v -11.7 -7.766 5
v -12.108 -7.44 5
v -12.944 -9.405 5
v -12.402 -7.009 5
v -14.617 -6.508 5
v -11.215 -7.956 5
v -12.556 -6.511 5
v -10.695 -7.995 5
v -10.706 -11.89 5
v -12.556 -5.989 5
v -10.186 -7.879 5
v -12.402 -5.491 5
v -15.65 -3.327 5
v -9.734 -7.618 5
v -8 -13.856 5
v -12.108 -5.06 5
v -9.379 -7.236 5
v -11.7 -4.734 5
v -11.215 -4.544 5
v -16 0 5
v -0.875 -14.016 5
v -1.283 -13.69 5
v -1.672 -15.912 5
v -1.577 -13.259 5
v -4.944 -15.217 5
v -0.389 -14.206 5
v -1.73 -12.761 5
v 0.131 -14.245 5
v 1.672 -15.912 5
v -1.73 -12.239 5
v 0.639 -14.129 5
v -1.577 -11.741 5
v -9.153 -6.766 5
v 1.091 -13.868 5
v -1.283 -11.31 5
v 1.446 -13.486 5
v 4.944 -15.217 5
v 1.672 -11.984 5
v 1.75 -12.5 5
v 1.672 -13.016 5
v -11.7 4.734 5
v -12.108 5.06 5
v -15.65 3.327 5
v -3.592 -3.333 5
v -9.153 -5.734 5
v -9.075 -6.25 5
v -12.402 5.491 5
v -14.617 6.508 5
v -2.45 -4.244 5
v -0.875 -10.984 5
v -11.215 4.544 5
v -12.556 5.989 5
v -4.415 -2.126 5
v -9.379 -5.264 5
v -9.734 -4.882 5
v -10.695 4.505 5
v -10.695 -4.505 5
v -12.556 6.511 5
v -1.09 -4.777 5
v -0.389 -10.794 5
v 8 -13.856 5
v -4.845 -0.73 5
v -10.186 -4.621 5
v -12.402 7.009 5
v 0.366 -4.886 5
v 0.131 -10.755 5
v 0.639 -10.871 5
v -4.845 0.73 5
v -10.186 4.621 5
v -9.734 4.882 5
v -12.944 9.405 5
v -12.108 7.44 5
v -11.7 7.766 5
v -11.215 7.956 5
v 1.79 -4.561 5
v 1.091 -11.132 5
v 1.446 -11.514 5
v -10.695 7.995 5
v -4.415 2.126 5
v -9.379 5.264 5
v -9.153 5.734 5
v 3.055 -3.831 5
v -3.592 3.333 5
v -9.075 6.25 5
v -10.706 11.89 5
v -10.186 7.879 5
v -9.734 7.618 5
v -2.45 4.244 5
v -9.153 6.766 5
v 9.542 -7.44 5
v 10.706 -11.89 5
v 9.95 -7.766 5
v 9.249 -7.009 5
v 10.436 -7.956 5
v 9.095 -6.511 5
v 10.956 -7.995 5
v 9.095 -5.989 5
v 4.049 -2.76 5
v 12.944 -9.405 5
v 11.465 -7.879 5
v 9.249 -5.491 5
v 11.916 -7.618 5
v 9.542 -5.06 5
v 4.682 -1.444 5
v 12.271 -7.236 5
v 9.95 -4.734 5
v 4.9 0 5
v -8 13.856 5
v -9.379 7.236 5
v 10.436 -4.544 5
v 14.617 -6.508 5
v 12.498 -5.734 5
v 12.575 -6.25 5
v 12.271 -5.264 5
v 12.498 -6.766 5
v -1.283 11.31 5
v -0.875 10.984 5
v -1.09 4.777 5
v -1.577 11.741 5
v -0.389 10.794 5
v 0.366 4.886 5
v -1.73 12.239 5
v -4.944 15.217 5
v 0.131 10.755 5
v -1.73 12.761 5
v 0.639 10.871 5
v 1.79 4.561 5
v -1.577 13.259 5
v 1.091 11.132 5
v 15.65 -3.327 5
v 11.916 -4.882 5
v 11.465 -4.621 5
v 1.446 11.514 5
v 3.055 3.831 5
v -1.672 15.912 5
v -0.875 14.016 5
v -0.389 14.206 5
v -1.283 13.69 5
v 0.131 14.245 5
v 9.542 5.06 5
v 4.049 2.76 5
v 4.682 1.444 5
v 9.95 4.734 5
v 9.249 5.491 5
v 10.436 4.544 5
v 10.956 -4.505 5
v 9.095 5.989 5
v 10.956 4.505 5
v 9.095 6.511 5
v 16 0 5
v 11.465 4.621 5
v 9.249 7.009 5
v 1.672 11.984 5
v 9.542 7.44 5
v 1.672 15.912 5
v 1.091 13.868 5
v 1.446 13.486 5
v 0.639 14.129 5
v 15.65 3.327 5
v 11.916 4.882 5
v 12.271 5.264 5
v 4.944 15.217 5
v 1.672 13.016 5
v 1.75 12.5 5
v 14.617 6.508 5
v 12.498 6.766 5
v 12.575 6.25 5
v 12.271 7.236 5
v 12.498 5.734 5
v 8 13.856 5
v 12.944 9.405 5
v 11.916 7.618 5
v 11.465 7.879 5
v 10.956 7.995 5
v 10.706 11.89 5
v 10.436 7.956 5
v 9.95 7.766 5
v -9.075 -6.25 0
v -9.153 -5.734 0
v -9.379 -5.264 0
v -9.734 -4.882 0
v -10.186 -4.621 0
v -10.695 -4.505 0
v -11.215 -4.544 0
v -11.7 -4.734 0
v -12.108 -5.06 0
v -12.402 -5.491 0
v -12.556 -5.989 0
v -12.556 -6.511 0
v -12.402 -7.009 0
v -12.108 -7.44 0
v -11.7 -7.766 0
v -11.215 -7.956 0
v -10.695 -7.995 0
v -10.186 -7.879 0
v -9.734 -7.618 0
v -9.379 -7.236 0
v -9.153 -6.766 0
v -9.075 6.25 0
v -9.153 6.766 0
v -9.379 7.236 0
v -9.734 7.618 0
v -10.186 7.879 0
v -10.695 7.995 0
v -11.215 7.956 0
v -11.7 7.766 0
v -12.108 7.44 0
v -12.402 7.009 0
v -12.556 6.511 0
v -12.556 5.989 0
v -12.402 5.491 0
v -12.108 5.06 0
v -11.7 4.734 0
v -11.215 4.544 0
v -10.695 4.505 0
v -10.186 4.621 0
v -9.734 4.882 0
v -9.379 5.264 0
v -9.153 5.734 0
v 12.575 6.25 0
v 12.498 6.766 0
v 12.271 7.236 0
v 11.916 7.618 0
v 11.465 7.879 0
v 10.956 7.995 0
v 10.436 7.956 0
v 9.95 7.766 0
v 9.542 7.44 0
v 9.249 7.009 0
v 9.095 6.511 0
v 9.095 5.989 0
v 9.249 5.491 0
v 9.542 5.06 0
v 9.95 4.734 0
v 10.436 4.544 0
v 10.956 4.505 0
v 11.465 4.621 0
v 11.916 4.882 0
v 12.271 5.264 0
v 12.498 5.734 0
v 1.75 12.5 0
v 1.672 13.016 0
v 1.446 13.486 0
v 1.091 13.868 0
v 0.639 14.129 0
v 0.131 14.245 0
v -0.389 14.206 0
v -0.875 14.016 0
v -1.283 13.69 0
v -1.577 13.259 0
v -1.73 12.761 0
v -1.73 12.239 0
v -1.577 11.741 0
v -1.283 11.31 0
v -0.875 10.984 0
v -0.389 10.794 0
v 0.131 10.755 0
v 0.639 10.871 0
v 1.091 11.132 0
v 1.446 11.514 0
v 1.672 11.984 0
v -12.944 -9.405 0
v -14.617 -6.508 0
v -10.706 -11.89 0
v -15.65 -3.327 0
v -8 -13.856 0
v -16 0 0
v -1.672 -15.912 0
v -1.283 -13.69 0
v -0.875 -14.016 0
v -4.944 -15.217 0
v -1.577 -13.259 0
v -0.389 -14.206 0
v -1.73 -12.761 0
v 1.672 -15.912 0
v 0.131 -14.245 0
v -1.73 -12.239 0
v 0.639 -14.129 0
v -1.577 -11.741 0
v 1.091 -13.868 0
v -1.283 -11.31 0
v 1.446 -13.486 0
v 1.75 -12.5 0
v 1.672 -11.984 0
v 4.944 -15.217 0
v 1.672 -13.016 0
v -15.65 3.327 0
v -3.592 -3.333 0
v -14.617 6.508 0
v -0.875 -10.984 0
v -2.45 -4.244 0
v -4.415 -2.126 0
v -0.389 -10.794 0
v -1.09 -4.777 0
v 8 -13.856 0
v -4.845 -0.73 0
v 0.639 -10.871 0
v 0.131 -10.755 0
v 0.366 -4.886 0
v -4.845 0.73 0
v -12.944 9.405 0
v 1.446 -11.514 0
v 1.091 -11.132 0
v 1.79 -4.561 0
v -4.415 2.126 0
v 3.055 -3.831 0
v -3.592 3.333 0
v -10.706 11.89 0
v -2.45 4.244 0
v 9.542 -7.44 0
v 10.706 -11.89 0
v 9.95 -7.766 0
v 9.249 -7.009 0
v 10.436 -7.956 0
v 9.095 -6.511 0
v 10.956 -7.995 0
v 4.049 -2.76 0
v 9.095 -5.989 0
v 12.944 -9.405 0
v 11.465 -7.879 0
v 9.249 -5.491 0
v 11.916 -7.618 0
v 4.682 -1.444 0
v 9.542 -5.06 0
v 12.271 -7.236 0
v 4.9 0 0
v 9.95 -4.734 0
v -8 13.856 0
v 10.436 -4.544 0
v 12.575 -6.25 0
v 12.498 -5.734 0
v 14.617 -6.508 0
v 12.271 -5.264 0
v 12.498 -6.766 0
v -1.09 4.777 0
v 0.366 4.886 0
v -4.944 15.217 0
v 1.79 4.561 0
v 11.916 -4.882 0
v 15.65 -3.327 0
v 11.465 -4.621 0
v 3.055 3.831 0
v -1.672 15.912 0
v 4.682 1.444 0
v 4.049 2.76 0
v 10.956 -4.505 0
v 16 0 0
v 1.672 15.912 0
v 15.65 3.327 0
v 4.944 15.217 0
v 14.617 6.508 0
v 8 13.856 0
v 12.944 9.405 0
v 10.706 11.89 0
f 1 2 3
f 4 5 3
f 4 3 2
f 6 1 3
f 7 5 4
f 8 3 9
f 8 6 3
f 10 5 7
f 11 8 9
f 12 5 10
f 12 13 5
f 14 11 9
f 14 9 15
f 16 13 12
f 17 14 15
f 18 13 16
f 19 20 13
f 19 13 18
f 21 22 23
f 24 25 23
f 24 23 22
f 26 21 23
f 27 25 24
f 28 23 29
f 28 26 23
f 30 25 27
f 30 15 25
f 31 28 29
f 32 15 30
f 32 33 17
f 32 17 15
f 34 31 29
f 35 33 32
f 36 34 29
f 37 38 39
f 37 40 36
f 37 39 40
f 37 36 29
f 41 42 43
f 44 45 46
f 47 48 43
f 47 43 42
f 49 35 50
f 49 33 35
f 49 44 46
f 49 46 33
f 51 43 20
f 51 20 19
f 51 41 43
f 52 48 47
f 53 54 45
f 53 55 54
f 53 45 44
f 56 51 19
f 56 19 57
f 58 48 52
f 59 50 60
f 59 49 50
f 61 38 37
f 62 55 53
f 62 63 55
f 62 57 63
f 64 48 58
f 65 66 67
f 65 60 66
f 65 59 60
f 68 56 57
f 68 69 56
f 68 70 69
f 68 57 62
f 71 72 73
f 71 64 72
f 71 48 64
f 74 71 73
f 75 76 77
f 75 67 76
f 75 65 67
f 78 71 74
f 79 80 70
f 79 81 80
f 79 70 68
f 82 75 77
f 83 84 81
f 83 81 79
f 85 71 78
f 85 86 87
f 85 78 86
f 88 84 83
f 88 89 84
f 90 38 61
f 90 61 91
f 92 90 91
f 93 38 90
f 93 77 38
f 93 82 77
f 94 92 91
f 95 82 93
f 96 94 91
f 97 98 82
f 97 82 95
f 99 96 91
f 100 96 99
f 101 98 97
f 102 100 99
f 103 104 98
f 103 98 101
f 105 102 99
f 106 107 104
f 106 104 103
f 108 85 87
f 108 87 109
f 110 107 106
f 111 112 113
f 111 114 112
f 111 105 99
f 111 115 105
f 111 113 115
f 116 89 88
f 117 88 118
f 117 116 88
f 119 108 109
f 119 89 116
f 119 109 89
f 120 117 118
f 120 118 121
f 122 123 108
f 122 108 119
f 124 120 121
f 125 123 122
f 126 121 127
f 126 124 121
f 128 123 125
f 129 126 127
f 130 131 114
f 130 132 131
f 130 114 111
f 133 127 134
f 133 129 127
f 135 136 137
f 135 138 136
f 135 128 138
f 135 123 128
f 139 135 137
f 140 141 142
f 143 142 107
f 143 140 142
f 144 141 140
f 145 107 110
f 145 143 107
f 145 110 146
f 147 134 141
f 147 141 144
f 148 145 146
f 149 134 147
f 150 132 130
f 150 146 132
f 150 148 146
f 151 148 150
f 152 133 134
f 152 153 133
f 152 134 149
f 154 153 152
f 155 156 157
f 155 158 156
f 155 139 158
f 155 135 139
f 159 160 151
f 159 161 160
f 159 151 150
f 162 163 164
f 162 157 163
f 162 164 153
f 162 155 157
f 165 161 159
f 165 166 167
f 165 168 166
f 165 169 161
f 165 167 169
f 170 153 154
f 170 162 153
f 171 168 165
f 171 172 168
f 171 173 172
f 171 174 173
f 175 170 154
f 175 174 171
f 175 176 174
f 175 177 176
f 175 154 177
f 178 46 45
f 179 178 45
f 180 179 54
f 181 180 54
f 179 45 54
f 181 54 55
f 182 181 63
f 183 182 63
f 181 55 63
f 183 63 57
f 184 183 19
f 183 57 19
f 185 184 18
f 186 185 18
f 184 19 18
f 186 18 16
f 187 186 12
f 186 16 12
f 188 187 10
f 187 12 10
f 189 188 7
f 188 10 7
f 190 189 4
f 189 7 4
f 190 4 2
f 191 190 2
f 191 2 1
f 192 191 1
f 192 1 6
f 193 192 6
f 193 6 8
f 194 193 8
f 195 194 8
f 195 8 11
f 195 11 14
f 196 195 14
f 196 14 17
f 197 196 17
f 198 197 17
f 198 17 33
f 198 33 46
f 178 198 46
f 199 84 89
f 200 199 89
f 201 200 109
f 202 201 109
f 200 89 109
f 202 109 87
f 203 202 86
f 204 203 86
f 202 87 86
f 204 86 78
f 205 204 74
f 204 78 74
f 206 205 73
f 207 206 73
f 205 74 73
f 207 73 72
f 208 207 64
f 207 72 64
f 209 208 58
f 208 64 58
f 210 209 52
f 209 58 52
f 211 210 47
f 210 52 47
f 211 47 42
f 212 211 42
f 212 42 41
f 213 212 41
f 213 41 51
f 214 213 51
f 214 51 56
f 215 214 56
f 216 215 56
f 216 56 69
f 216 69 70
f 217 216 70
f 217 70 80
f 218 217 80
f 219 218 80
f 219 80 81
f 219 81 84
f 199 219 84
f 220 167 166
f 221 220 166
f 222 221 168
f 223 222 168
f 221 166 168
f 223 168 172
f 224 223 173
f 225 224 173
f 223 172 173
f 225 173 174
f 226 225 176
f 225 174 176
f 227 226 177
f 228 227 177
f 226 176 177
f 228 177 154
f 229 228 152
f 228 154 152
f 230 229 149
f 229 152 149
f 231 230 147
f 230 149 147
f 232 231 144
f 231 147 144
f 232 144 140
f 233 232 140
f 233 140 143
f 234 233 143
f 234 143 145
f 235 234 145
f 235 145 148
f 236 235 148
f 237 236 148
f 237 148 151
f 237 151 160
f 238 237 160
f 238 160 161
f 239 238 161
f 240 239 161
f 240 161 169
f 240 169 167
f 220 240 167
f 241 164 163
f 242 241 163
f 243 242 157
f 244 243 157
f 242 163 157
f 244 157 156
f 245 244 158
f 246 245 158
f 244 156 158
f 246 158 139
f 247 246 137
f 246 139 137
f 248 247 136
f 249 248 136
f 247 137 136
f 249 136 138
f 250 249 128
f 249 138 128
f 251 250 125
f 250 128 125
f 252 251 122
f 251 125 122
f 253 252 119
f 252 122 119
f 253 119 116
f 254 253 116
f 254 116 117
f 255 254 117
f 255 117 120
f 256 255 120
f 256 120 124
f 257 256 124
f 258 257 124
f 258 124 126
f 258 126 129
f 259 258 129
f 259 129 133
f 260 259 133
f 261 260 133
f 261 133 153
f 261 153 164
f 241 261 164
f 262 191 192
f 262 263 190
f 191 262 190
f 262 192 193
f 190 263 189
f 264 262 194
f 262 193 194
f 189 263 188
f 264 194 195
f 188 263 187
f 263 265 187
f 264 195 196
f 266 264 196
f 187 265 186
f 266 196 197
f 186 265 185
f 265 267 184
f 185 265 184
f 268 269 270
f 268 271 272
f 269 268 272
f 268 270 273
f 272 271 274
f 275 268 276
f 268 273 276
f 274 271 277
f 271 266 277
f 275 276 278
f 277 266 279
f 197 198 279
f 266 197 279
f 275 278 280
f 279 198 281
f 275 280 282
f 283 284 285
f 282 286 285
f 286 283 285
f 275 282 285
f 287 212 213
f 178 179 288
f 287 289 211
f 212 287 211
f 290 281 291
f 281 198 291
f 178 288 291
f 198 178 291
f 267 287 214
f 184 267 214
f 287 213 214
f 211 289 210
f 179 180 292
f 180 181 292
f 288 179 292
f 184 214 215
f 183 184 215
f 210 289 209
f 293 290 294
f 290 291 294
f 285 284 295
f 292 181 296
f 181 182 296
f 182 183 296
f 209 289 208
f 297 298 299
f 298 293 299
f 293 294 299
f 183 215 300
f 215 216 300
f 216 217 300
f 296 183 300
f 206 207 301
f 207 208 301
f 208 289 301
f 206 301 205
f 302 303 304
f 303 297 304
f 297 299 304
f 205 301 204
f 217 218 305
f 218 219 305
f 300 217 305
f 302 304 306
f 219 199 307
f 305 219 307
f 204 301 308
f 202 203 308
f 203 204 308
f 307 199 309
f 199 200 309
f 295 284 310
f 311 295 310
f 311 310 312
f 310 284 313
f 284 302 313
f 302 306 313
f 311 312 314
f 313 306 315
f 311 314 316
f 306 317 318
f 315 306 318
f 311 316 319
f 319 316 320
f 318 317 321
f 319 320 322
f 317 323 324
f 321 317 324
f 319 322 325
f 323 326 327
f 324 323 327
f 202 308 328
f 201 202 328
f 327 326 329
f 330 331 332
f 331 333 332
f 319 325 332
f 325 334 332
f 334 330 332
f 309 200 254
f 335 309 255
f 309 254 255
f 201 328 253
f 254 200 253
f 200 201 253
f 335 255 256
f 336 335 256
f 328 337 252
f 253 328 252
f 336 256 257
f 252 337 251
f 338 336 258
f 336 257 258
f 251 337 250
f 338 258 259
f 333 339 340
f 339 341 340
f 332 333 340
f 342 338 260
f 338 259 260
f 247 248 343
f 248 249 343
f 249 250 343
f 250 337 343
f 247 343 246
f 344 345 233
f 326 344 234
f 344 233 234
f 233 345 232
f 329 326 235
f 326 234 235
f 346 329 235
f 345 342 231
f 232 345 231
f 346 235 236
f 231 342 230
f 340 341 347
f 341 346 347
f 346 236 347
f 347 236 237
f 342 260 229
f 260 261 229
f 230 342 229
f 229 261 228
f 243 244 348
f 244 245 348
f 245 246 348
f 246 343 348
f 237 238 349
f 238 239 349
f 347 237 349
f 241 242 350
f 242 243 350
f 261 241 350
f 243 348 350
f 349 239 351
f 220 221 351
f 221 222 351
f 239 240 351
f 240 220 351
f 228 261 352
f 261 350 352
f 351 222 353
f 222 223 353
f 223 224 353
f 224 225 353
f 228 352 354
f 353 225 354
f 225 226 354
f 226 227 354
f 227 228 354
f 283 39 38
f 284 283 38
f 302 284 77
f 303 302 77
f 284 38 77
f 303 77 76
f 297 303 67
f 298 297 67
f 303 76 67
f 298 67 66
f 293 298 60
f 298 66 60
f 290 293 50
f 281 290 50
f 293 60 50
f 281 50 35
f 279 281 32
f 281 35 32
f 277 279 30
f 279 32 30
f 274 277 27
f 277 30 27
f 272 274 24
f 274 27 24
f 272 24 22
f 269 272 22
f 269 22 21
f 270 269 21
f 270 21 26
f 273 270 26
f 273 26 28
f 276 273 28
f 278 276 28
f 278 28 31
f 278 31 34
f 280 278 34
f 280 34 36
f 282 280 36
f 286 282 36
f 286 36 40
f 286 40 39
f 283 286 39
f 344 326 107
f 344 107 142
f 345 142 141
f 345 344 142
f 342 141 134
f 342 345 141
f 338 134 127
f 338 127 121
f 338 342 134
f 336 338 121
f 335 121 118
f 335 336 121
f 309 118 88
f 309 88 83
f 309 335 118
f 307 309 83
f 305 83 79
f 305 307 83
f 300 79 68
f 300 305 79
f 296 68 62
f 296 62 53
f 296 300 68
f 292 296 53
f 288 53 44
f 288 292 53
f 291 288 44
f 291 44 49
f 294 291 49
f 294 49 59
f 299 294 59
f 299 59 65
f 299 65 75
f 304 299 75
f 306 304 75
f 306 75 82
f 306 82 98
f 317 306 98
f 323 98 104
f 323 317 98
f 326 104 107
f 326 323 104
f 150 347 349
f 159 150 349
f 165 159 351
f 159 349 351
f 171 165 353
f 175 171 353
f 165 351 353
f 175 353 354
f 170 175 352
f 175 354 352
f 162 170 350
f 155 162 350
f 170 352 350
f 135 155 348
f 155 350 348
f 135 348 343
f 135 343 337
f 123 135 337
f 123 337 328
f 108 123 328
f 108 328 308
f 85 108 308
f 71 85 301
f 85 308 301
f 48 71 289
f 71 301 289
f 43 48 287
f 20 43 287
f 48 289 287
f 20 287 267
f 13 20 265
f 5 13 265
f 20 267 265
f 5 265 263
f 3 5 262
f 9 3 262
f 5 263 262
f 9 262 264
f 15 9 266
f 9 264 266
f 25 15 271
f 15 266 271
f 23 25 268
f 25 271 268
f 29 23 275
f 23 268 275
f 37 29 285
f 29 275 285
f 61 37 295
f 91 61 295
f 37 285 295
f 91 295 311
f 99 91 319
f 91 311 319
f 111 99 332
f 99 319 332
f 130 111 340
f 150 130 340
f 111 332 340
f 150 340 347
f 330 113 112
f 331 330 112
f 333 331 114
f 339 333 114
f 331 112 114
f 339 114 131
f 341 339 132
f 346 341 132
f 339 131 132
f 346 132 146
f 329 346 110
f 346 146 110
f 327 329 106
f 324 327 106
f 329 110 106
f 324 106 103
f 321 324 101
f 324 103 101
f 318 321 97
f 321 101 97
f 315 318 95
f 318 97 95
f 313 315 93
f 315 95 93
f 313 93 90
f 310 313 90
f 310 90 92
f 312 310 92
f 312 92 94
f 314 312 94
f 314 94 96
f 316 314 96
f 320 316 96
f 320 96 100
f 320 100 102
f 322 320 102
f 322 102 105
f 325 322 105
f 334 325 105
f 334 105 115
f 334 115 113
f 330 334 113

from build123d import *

# Parameters (mm, degrees)
F0_R     = 16
F0_R_2   = 4.9
F1_DEPTH = 5
F2_R     = 1.75
F3_DEPTH = 25


with BuildPart() as f1:
    # F0 (on Top) → F1 (new body)
    with BuildSketch(Plane.XY):
        Circle(F0_R)
        Circle(F0_R_2, mode=Mode.SUBTRACT)
    extrude(amount=F1_DEPTH)

    # F2 (on face) → F3 (cut)
    with BuildSketch(Plane.XY.offset(5)):
        with Locations((0, 12.5)):
            Circle(F2_R)
        with Locations((10.825318, 6.25)):
            Circle(F2_R)
        with Locations((10.825318, -6.25)):
            Circle(F2_R)
        with Locations((0, -12.5)):
            Circle(F2_R)
        with Locations((-10.825318, -6.25)):
            Circle(F2_R)
        with Locations((-10.825318, 6.25)):
            Circle(F2_R)
    extrude(amount=-F3_DEPTH, mode=Mode.SUBTRACT)


solid = f1.part
